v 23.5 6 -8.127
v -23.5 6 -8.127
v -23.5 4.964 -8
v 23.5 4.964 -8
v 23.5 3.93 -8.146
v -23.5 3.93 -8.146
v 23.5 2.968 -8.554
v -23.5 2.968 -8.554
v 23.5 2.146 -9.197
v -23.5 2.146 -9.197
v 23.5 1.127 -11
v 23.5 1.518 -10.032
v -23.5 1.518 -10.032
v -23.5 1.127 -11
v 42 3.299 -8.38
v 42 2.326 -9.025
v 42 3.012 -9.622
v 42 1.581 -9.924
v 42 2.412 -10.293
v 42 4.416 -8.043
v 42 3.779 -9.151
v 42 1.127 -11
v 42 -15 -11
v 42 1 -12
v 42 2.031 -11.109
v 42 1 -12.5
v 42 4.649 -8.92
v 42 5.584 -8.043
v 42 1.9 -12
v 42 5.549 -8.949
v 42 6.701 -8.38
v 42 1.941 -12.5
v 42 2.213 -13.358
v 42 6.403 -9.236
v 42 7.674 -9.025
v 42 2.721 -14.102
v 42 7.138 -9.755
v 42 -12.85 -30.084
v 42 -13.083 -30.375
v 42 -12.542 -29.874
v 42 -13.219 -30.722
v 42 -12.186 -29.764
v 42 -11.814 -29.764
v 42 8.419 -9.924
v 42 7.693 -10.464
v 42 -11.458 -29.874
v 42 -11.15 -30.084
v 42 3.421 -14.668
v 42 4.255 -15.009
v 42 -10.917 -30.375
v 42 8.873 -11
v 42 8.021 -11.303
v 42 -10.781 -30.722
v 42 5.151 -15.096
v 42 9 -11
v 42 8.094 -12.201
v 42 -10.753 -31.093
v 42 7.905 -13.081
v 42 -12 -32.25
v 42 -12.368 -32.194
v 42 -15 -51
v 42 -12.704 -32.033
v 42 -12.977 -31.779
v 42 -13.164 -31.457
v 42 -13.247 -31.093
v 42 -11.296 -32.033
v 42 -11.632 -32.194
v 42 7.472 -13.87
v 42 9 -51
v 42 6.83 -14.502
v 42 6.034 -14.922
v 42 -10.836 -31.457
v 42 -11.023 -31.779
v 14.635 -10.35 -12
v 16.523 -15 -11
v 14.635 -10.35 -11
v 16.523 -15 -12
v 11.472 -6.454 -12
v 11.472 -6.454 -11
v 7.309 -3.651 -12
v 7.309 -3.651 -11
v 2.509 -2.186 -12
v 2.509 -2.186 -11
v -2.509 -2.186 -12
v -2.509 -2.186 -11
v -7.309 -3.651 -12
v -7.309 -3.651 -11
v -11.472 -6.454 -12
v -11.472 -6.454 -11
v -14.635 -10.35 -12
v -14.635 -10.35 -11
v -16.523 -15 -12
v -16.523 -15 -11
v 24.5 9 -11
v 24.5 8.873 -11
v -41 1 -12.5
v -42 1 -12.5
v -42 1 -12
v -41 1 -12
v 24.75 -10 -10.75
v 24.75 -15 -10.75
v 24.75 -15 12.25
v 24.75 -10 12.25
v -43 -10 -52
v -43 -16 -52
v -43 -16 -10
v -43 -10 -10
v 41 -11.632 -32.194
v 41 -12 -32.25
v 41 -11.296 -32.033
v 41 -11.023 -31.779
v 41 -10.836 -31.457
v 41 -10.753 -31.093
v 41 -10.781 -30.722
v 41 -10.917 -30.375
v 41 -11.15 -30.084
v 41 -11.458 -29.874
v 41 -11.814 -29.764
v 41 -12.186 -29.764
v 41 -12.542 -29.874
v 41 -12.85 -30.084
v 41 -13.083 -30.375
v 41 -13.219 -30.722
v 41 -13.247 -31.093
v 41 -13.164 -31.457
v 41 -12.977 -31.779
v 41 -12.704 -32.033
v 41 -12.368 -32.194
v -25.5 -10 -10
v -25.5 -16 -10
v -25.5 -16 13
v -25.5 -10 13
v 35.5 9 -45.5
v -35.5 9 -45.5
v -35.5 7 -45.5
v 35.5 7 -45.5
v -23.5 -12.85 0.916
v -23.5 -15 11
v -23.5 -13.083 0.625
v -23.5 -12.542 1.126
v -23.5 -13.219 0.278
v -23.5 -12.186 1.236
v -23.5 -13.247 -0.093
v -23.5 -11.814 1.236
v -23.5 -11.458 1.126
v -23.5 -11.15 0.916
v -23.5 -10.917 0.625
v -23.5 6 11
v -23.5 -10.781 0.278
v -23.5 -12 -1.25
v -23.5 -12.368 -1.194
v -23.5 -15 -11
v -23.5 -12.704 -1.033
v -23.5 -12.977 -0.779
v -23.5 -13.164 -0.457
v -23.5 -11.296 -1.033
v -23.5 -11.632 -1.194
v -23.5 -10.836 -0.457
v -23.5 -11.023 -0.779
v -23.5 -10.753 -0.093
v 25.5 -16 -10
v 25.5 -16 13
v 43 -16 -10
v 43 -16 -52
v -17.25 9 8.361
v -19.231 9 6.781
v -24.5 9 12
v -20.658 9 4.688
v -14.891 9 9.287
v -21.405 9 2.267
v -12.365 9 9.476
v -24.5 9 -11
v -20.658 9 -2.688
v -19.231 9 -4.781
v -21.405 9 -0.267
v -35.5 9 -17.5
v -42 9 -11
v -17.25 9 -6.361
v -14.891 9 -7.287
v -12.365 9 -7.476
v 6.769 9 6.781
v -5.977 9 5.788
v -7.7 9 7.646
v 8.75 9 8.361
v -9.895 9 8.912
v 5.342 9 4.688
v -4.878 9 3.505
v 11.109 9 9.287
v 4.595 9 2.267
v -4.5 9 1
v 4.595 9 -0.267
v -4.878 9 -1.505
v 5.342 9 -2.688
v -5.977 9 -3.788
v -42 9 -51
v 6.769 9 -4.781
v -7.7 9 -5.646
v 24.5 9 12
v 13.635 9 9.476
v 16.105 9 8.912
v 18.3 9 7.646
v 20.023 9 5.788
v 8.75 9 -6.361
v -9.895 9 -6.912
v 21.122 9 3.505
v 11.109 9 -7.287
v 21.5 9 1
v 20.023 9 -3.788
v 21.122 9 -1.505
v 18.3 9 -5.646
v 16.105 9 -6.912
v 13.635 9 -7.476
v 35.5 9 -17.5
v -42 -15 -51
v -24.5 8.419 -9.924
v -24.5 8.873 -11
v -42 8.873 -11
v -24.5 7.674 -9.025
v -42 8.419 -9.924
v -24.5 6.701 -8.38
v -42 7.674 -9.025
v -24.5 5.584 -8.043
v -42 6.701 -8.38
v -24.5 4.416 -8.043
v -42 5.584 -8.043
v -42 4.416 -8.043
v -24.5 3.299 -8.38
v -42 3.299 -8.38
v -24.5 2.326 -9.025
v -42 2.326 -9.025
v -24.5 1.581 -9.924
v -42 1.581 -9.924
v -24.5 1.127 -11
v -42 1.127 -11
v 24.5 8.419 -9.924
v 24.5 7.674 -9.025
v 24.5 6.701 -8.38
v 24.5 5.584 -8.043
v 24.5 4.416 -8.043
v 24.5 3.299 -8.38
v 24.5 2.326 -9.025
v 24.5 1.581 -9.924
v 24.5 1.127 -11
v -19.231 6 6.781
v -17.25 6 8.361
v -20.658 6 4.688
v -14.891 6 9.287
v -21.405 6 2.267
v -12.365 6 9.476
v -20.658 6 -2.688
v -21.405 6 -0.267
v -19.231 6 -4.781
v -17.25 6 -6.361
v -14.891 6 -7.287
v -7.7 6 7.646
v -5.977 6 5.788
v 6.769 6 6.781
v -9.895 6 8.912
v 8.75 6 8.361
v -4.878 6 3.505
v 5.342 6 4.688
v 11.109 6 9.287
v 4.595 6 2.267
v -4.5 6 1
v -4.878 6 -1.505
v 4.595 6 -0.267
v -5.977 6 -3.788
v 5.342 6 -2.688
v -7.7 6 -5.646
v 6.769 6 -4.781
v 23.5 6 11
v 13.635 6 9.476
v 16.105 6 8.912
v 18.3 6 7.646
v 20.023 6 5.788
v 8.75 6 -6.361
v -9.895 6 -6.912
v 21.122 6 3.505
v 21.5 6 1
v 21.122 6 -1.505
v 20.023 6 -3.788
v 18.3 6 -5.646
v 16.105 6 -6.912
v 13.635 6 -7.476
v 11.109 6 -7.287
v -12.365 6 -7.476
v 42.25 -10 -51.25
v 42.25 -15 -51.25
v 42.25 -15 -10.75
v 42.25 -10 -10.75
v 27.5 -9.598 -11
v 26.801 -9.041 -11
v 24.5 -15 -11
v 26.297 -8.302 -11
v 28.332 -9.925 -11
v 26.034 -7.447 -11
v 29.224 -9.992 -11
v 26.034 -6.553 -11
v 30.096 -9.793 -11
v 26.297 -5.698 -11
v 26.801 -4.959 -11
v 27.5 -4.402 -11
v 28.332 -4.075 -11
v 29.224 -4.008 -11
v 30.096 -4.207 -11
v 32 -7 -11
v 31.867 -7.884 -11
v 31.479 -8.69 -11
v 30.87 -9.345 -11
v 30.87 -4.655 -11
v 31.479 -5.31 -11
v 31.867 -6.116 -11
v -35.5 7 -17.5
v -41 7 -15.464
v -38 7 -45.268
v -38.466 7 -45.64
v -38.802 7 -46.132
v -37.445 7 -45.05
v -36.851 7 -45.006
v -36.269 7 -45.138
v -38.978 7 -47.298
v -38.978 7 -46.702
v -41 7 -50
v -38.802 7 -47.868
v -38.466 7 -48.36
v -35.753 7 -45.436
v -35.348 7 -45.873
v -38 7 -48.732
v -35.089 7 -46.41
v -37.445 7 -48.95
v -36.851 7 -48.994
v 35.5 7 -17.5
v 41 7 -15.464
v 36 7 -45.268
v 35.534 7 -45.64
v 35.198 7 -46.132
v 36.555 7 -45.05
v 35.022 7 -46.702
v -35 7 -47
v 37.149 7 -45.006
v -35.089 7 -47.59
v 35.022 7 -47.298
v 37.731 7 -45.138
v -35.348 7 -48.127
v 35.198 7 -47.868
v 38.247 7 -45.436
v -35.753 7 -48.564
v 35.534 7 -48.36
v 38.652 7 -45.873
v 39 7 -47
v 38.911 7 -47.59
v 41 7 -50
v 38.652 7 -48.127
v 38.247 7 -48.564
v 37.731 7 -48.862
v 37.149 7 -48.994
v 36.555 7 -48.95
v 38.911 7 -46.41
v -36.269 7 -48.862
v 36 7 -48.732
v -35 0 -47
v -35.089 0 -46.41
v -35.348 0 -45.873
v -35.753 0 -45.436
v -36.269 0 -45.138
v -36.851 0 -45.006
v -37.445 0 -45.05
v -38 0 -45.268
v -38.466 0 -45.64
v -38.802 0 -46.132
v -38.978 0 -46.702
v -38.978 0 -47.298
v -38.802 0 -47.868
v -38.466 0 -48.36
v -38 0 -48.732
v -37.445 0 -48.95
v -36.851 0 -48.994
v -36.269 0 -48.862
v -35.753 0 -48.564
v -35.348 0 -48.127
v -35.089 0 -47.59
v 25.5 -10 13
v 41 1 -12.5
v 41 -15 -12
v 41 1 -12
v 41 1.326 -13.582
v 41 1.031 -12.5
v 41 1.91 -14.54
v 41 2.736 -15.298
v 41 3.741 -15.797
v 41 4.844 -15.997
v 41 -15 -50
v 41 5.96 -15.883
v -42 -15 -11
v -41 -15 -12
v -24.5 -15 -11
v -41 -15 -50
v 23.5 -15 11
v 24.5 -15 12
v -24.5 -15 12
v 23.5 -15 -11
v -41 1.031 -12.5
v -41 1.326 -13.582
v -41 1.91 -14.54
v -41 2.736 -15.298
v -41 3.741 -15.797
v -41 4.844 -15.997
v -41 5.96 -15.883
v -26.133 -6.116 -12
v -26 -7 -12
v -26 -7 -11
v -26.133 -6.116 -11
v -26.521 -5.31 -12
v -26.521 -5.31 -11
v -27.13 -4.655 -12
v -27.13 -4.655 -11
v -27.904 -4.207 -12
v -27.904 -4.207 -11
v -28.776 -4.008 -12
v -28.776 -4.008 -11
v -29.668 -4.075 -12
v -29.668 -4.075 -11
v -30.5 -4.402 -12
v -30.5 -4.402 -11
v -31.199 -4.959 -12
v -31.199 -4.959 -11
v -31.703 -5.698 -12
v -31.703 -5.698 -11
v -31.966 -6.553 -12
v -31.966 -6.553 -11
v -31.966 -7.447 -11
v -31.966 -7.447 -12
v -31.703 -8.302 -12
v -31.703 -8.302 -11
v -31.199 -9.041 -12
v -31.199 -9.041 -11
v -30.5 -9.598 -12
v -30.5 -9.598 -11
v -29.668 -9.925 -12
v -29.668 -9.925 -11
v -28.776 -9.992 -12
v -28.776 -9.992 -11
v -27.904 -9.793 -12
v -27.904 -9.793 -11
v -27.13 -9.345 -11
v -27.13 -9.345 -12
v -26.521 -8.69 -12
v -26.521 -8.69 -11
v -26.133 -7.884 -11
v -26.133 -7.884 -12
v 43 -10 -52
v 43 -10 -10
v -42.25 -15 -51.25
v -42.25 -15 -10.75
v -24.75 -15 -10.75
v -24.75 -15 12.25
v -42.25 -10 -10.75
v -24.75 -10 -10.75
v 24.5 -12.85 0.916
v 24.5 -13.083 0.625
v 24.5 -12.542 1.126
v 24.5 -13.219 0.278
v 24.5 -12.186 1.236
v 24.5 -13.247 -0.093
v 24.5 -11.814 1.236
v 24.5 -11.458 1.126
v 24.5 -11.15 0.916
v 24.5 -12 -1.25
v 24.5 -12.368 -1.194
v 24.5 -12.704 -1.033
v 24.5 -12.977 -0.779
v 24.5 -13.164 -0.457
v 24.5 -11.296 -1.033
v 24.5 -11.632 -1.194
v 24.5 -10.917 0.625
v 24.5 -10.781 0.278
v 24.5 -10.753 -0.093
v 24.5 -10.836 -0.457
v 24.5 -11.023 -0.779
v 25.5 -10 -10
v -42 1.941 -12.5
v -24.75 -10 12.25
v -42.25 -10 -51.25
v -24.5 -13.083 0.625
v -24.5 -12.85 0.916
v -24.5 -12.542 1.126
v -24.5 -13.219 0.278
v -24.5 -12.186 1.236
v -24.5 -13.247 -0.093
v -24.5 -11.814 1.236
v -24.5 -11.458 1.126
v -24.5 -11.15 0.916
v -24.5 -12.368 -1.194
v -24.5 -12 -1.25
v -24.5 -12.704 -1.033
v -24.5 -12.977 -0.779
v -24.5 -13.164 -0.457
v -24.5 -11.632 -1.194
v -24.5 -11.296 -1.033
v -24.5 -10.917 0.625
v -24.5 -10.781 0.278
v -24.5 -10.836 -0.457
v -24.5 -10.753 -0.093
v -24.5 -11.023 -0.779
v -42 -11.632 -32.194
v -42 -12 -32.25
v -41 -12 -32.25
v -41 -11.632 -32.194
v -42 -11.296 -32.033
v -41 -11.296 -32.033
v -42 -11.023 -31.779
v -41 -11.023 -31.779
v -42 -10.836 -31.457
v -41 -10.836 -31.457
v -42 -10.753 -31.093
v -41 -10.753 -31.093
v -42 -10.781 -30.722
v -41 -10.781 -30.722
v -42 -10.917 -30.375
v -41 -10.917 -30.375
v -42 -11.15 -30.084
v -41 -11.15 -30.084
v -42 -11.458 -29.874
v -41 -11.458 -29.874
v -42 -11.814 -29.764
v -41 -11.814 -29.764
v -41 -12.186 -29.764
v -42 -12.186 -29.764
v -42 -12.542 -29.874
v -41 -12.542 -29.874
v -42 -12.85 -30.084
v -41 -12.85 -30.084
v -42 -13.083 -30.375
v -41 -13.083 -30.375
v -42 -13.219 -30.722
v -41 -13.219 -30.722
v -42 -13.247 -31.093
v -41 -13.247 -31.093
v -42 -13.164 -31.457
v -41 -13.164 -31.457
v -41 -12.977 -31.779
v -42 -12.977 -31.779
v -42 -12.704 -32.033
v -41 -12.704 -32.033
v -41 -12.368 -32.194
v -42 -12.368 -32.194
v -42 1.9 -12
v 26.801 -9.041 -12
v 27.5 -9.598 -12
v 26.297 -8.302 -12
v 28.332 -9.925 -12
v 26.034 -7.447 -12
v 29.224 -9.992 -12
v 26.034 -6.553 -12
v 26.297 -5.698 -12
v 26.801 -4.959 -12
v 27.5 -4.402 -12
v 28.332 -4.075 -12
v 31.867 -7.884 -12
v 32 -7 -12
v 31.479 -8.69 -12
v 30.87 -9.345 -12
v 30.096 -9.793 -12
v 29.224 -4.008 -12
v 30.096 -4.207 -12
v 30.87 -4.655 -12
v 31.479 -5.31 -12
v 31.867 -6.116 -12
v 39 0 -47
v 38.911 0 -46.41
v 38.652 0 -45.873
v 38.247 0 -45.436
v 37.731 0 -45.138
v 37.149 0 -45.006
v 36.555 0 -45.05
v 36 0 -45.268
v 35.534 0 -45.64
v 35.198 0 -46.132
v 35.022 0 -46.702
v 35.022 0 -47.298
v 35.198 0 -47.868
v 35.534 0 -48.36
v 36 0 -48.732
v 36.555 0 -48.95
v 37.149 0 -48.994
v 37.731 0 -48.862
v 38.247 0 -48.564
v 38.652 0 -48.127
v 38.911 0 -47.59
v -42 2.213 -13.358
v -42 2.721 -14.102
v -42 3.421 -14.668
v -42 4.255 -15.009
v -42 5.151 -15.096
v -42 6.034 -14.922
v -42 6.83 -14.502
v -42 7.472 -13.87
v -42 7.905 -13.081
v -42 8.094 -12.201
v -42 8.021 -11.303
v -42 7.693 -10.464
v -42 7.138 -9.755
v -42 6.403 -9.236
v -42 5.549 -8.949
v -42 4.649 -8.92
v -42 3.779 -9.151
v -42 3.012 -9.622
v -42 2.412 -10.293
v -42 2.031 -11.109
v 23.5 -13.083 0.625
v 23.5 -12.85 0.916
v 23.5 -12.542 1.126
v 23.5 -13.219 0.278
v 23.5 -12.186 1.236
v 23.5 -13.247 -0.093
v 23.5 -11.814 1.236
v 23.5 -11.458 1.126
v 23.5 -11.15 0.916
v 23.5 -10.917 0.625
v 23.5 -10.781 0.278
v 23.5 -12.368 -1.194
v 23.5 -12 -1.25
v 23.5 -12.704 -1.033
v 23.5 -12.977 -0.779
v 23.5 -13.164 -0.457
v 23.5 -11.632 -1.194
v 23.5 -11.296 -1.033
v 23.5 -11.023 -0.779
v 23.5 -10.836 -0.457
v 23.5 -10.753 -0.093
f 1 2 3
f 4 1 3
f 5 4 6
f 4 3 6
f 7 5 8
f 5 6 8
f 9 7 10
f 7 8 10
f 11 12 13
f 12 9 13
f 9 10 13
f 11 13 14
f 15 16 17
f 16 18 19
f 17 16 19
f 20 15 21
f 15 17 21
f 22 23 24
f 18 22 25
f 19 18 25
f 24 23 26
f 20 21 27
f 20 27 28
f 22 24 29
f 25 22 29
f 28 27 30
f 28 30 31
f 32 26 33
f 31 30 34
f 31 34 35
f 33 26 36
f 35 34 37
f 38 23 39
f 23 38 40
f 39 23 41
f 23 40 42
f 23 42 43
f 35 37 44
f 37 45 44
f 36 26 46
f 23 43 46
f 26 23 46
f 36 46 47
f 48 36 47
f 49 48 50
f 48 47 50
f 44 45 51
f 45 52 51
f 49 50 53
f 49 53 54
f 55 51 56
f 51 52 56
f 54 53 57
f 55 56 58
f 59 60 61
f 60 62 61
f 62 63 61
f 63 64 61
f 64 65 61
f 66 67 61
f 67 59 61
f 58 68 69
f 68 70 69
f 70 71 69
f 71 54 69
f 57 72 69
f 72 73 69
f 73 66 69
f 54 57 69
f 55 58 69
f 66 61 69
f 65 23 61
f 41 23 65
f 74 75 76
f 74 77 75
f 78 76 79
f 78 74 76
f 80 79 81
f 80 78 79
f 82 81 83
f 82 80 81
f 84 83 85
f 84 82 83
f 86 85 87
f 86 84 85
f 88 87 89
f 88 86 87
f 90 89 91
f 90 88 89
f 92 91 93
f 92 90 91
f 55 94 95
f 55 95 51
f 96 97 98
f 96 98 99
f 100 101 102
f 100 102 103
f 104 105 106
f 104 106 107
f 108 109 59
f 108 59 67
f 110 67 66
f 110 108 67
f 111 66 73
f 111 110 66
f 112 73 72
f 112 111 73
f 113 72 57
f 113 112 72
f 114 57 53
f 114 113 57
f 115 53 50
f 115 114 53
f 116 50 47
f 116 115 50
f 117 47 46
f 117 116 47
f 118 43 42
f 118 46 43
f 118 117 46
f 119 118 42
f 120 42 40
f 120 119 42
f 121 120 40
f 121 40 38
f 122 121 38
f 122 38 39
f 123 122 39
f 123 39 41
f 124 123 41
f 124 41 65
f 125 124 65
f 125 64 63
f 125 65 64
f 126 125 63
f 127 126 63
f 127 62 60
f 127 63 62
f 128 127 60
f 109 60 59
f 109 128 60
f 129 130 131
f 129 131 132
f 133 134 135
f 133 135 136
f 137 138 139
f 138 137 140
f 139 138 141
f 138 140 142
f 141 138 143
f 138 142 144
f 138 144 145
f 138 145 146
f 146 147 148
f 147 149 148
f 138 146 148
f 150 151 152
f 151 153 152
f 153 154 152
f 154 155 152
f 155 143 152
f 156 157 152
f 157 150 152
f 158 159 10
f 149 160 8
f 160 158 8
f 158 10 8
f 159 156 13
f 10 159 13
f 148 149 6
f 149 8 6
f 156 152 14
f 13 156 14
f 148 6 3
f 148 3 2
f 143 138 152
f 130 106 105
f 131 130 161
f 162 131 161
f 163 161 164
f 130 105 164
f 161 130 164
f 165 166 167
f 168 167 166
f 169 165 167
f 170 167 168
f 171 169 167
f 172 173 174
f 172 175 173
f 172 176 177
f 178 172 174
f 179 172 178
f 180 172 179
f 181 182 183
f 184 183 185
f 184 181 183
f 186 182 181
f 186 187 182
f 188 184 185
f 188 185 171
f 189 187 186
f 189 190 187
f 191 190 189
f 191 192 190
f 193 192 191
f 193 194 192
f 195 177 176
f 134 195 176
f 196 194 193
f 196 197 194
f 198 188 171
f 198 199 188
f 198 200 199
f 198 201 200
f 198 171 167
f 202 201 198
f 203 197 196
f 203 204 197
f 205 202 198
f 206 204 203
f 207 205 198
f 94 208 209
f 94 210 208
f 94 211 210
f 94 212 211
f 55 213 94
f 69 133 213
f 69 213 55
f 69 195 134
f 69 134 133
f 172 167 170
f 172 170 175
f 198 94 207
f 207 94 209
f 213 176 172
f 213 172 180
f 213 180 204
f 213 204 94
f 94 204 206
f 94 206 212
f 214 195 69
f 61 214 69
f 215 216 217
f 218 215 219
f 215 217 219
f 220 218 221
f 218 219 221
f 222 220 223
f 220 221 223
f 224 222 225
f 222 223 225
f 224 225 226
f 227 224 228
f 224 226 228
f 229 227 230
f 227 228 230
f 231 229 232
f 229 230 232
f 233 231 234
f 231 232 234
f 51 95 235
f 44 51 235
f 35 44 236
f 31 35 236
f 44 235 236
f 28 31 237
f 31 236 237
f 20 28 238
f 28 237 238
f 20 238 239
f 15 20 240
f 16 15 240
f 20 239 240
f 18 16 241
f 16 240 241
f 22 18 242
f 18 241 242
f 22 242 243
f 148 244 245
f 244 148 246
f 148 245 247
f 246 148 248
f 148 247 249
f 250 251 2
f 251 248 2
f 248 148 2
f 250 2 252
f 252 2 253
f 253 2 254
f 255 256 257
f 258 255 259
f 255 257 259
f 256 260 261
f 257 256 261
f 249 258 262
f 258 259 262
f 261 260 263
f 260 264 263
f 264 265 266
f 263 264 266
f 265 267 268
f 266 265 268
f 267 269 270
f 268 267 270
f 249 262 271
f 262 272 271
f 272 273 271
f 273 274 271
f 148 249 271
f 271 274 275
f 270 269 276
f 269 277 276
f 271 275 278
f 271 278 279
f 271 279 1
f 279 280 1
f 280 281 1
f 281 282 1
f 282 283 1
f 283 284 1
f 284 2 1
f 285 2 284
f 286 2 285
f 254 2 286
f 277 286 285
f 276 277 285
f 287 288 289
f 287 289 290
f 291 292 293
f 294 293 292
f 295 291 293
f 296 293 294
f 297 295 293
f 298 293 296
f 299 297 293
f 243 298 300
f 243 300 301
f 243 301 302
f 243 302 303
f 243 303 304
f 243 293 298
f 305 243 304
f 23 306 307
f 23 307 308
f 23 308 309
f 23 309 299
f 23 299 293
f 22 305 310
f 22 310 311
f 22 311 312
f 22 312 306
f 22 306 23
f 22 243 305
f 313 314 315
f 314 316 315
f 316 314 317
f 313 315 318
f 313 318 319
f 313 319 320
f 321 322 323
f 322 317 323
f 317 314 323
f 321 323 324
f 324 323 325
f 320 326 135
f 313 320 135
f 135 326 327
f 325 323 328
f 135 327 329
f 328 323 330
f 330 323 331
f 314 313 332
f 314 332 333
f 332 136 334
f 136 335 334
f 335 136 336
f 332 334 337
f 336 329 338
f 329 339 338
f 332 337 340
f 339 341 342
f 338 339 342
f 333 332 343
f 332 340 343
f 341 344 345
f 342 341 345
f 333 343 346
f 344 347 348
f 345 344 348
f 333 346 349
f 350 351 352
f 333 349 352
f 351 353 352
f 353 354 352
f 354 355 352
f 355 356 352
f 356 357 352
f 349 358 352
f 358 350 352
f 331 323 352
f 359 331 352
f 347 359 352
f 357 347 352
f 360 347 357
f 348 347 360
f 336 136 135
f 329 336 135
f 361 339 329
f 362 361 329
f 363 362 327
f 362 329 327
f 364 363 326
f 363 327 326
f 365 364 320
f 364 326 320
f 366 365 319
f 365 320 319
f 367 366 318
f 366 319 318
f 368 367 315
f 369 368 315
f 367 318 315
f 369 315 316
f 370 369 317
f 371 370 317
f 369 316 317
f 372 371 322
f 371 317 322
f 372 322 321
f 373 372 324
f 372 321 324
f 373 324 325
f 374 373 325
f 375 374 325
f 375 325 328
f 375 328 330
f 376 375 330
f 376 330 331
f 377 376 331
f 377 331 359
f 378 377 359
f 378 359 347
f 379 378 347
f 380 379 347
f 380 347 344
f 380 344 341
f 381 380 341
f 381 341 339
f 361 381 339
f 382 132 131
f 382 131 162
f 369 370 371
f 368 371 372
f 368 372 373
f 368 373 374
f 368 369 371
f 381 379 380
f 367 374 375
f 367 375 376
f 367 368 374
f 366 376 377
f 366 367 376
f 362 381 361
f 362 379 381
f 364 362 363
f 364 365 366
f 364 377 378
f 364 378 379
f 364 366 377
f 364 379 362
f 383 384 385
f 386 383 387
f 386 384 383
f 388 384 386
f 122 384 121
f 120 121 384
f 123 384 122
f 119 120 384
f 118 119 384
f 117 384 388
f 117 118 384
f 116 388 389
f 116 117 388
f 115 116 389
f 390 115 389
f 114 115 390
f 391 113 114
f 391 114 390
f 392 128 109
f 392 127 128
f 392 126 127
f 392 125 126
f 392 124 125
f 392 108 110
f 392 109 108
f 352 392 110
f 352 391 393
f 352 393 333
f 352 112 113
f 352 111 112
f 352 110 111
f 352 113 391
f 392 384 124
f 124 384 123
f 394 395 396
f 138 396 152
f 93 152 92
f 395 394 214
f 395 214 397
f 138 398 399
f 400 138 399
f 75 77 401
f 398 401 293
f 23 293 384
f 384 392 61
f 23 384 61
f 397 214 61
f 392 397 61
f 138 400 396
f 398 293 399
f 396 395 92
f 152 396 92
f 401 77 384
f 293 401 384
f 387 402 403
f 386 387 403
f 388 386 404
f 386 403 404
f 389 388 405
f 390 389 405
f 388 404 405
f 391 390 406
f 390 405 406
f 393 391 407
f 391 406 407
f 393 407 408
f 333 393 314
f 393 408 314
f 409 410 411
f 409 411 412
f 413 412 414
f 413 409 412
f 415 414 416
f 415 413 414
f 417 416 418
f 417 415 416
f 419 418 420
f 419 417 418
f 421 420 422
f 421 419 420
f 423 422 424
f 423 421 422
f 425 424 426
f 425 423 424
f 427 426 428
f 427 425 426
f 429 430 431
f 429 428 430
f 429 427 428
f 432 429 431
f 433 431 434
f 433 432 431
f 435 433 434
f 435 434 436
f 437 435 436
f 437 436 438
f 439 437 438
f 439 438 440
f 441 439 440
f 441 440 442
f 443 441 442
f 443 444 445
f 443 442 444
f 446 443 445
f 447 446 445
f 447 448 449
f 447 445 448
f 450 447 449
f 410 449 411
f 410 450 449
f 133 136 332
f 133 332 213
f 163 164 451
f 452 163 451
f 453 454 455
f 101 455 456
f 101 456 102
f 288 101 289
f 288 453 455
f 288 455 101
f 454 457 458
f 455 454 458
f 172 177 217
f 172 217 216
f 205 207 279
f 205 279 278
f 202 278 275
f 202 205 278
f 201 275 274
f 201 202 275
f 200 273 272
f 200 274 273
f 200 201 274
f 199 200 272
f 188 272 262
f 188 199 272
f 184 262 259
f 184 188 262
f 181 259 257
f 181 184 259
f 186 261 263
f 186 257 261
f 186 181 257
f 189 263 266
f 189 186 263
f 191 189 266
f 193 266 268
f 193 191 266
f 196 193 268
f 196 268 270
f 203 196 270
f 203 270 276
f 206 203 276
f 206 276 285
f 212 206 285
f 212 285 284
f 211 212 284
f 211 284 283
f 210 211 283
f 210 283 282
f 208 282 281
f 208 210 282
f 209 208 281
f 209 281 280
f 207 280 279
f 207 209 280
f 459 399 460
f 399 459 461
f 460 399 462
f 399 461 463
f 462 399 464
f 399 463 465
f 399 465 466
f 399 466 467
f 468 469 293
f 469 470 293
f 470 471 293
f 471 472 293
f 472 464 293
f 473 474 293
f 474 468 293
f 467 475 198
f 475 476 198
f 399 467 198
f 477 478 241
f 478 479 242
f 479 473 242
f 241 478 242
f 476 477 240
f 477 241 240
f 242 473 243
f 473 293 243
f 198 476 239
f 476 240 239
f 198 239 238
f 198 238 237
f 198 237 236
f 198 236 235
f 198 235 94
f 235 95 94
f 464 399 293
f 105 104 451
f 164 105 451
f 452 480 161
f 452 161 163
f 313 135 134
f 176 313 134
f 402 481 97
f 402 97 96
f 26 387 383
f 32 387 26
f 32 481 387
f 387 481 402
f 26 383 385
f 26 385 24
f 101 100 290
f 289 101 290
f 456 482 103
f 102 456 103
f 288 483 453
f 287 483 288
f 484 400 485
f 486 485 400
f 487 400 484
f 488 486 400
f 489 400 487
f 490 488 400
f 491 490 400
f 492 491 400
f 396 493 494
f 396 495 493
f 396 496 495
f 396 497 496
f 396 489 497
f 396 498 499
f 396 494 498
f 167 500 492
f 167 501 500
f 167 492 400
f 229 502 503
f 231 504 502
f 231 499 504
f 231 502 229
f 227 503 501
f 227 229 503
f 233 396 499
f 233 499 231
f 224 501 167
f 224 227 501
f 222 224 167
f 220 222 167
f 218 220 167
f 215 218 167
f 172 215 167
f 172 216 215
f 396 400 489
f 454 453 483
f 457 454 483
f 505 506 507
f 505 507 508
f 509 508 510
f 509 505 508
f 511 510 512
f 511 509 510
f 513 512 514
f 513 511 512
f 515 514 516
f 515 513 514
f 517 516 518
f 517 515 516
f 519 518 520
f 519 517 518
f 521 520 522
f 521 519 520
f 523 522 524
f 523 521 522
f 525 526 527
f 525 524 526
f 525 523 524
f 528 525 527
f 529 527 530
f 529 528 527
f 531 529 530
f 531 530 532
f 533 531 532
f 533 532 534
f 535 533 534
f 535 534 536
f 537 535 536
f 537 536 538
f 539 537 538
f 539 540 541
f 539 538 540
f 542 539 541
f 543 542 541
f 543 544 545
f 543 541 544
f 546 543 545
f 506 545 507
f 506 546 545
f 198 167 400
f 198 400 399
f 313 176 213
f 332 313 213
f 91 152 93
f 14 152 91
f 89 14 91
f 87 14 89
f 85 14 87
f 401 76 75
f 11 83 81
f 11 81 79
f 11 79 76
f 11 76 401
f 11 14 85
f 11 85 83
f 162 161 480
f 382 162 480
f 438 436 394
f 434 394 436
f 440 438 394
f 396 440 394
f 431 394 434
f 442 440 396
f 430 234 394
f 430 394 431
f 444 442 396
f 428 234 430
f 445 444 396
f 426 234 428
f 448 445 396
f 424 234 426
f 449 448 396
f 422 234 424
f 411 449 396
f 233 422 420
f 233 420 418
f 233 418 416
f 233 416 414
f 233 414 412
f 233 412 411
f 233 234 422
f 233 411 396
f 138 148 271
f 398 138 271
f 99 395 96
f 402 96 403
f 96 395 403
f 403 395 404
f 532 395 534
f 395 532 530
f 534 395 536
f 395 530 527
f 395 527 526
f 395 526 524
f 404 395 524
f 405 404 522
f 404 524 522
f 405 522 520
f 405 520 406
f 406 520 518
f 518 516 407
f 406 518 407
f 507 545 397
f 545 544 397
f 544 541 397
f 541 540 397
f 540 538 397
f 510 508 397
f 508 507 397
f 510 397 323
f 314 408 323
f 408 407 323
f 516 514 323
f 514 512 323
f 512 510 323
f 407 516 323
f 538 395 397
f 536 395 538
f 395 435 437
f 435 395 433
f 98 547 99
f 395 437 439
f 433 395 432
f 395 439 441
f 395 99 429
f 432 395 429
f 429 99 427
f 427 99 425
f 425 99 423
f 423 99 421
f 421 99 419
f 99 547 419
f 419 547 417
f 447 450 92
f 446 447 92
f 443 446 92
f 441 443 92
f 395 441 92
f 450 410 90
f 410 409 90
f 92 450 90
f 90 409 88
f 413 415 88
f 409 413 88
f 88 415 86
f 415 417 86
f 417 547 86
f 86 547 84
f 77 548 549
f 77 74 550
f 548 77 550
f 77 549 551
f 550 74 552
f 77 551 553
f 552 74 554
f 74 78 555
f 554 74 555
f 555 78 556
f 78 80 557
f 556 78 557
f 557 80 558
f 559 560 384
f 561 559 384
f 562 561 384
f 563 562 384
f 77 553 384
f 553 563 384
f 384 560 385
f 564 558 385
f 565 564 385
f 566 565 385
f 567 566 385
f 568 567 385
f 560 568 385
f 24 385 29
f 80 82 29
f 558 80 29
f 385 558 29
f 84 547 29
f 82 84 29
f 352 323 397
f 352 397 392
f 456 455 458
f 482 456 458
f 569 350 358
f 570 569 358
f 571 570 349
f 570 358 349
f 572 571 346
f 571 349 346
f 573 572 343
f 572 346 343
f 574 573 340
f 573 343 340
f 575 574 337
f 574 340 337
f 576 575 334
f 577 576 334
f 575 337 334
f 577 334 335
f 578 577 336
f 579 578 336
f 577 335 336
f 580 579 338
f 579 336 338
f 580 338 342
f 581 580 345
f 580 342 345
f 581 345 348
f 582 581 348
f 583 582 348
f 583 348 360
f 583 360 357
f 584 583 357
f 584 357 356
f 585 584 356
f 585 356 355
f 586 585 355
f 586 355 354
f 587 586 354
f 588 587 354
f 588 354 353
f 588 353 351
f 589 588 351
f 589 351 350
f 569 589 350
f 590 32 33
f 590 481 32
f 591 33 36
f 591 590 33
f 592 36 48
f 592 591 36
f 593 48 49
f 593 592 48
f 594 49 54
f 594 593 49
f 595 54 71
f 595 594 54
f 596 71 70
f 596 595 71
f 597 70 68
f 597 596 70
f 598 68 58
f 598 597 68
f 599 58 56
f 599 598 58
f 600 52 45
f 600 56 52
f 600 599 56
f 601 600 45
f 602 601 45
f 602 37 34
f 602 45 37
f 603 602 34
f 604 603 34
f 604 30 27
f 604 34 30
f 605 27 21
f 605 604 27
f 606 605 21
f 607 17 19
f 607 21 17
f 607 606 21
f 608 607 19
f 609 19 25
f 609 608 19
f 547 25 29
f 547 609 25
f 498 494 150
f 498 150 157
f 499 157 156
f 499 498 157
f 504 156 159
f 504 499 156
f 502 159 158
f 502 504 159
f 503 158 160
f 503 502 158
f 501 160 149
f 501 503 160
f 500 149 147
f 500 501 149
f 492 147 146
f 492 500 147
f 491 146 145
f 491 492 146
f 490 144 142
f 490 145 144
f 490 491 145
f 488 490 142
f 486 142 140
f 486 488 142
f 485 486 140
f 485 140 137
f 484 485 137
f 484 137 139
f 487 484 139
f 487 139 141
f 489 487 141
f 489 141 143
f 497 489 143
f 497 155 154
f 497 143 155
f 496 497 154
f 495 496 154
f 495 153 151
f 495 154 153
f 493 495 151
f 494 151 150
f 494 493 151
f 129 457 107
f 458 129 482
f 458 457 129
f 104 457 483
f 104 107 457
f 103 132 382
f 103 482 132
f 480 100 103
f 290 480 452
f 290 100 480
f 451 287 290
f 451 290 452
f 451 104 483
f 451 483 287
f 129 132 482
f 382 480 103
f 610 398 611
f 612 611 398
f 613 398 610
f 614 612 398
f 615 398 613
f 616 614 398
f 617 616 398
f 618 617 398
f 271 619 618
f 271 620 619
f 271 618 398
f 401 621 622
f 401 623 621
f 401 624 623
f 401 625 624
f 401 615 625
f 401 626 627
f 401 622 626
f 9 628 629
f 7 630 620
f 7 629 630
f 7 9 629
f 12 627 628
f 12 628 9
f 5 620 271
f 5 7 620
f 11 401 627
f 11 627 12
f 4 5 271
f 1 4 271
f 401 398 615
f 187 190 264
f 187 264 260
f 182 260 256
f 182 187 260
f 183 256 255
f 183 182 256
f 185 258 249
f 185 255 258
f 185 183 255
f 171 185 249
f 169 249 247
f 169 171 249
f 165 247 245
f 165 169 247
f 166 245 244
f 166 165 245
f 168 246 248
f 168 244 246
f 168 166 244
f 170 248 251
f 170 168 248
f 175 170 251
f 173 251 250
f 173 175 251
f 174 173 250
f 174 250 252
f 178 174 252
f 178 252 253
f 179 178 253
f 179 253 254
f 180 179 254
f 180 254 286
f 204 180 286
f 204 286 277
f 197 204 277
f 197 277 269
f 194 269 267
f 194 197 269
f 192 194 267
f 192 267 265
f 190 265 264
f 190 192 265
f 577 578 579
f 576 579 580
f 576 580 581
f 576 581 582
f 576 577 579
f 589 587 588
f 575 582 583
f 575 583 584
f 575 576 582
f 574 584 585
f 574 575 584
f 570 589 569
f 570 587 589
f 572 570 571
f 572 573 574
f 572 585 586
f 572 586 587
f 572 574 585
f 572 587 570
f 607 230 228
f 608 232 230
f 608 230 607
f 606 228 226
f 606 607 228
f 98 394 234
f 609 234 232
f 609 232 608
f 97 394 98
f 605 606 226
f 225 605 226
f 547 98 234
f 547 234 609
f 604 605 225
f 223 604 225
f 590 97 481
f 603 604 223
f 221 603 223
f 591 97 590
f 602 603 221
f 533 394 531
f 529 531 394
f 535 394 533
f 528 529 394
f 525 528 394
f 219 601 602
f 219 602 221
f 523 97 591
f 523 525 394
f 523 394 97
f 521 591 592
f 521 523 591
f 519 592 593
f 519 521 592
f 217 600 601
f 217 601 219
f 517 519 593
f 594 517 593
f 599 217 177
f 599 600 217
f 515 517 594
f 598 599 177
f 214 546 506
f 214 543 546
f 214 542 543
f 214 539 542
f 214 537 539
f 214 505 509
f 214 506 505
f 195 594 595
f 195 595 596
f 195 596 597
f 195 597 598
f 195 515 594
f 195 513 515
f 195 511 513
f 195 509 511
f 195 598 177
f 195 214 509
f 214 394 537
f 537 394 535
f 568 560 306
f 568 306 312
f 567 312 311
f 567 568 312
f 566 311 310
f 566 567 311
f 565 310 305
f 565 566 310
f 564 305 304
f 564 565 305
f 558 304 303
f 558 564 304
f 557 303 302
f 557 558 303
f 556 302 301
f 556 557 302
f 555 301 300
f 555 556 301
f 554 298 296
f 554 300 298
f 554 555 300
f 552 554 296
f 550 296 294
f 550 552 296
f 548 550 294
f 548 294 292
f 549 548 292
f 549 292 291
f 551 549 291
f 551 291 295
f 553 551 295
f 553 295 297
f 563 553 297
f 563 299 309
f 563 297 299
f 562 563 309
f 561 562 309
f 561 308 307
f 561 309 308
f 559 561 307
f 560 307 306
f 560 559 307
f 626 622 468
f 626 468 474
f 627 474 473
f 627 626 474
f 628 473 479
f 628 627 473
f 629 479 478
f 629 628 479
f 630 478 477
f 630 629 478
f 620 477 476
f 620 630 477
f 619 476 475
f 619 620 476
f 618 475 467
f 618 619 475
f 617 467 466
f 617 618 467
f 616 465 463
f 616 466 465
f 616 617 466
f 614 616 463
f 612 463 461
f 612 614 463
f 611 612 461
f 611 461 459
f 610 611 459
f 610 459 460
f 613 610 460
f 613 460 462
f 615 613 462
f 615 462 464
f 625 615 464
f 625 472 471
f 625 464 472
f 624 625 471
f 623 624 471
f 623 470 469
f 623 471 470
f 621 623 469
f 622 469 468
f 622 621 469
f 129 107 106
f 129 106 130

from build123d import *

# Parameters (mm, degrees)
CYLINDER004_R           = 1.25
CYLINDER004_DEPTH       = 50
CYLINDER004_PITCH_ANGLE = 90
CYLINDER009_R           = 1.25
CYLINDER009_DEPTH       = 86
CYLINDER009_PITCH_ANGLE = 90
CYLINDER010_R           = 3
CYLINDER010_DEPTH       = 10
CYLINDER005_R           = 3
CYLINDER005_DEPTH       = 10
BOX002_W                = 84
BOX002_H                = 3
BOX002_DEPTH            = 0.5
CYLINDER002_R           = 3.1
CYLINDER002_DEPTH       = 84
CYLINDER002_PITCH_ANGLE = 90
CYLINDER007_R           = 17
CYLINDER007_DEPTH       = 6
BOX005_W                = 71
BOX005_H                = 24
BOX005_DEPTH            = 28
BOX004_W                = 82
BOX004_H                = 24
BOX004_DEPTH            = 38
BOX003_W                = 84
BOX003_H                = 24
BOX003_DEPTH            = 40
CYLINDER003_R           = 4
CYLINDER003_DEPTH       = 84
CYLINDER003_PITCH_ANGLE = 90
CYLINDER008_R           = 2
CYLINDER008_DEPTH       = 8
CYLINDER008_ROLL_ANGLE  = 90
CYLINDER006_R           = 2
CYLINDER006_DEPTH       = 8
CYLINDER006_ROLL_ANGLE  = 90
CYLINDER001_R           = 8.5
CYLINDER001_DEPTH       = 20
CYLINDER001_ROLL_ANGLE  = 90
CYLINDER_R              = 8.5
CYLINDER_DEPTH          = 20
CYLINDER_ROLL_ANGLE     = 90
BOX001_W                = 47
BOX001_H                = 22
BOX001_DEPTH            = 23
BOX_W                   = 49
BOX_H                   = 24
BOX_DEPTH               = 24
BOX009_W                = 49.5
BOX009_H                = 24
BOX009_DEPTH            = 24.5
BOX008_W                = 84.5
BOX008_H                = 24
BOX008_DEPTH            = 40.5
BOX007_W                = 51
BOX007_H                = 6
BOX007_DEPTH            = 26
BOX006_W                = 86
BOX006_H                = 6
BOX006_DEPTH            = 42


with BuildPart() as recorte_tornillos_tapa:
    # Cylinder004 → Cylinder004 (new body)
    with BuildSketch(Plane.XY):
        Circle(CYLINDER004_R)
    extrude(amount=CYLINDER004_DEPTH)


with BuildPart() as recorte_tornillos_tapa_1:
    # Cylinder004 pitch: moved
    add(recorte_tornillos_tapa.part.rotate(Axis((0, 0, 0), (0, 1, 0)), CYLINDER004_PITCH_ANGLE))


with BuildPart() as recorte_tornillos_tapa_2:
    # Cylinder004 placement: moved
    add(recorte_tornillos_tapa_1.part.moved(Location((-25, -12, 0))))


with BuildPart() as recorte_tornillos_tapa001:
    # Cylinder009 → Cylinder009 (new body)
    with BuildSketch(Plane.XY):
        Circle(CYLINDER009_R)
    extrude(amount=CYLINDER009_DEPTH)


with BuildPart() as recorte_tornillos_tapa001_1:
    # Cylinder009 pitch: moved
    add(recorte_tornillos_tapa001.part.rotate(Axis((0, 0, 0), (0, 1, 0)), CYLINDER009_PITCH_ANGLE))


with BuildPart() as recorte_tornillos_tapa001_2:
    # Cylinder009 placement: moved
    add(recorte_tornillos_tapa001_1.part.moved(Location((-43, -12, -31))))


with BuildPart() as recorte_cables001:
    # Cylinder010 → Cylinder010 (new body)
    with BuildSketch(Plane(origin=(-29, -7, -17), x_dir=(1, 0, 0), z_dir=(0, 0, 1))):
        Circle(CYLINDER010_R)
    extrude(amount=CYLINDER010_DEPTH)


with BuildPart() as fusion002:
    # Cylinder005 → Cylinder005 (new body)
    with BuildSketch(Plane(origin=(29, -7, -17), x_dir=(1, 0, 0), z_dir=(0, 0, 1))):
        Circle(CYLINDER005_R)
    extrude(amount=CYLINDER005_DEPTH)

    # Fusion002: union recorte tornillos tapa, recorte tornillos tapa001, recorte cables001
    add(recorte_tornillos_tapa_2.part)
    add(recorte_tornillos_tapa001_2.part)
    add(recorte_cables001.part)


with BuildPart() as recorte_eje:
    # Box002 → Box002 (new body)
    with BuildSketch(Plane(origin=(-42, 1, -12.5), x_dir=(1, 0, 0), z_dir=(0, 0, 1))):
        with Locations((42, 1.5)):
            Rectangle(BOX002_W, BOX002_H)
    extrude(amount=BOX002_DEPTH)


with BuildPart() as recorte_central_eje:
    # Cylinder002 → Cylinder002 (new body)
    with BuildSketch(Plane.XY):
        Circle(CYLINDER002_R)
    extrude(amount=CYLINDER002_DEPTH)


with BuildPart() as recorte_central_eje_1:
    # Cylinder002 pitch: moved
    add(recorte_central_eje.part.rotate(Axis((0, 0, 0), (0, 1, 0)), CYLINDER002_PITCH_ANGLE))


with BuildPart() as recorte_central_eje_2:
    # Cylinder002 placement: moved
    add(recorte_central_eje_1.part.moved(Location((-42, 5, -12))))


with BuildPart() as recorte_pasos:
    # Cylinder007 → Cylinder007 (new body)
    with BuildSketch(Plane(origin=(0, -19, -16), x_dir=(1, 0, 0), z_dir=(0, 0, 1))):
        Circle(CYLINDER007_R)
    extrude(amount=CYLINDER007_DEPTH)


with BuildPart() as recorte_lcd:
    # Box005 → Box005 (new body)
    with BuildSketch(Plane(origin=(-35.5, -14, -45.5), x_dir=(1, 0, 0), z_dir=(0, 0, 1))):
        with Locations((35.5, 12)):
            Rectangle(BOX005_W, BOX005_H)
    extrude(amount=BOX005_DEPTH)


with BuildPart() as recorte_baselcd:
    # Box004 → Box004 (new body)
    with BuildSketch(Plane(origin=(-41, -17, -50), x_dir=(1, 0, 0), z_dir=(0, 0, 1))):
        with Locations((41, 12)):
            Rectangle(BOX004_W, BOX004_H)
    extrude(amount=BOX004_DEPTH)


with BuildPart() as base_lcd:
    # Box003 → Box003 (new body)
    with BuildSketch(Plane(origin=(-42, -15, -51), x_dir=(1, 0, 0), z_dir=(0, 0, 1))):
        with Locations((42, 12)):
            Rectangle(BOX003_W, BOX003_H)
    extrude(amount=BOX003_DEPTH)

    # Cut002: cut recorte_baseLCD
    add(recorte_baselcd.part, mode=Mode.SUBTRACT)

    # Cut003: cut recorte_LCD
    add(recorte_lcd.part, mode=Mode.SUBTRACT)


with BuildPart() as eje_central:
    # Cylinder003 → Cylinder003 (new body)
    with BuildSketch(Plane.XY):
        Circle(CYLINDER003_R)
    extrude(amount=CYLINDER003_DEPTH)


with BuildPart() as eje_central_1:
    # Cylinder003 pitch: moved
    add(eje_central.part.rotate(Axis((0, 0, 0), (0, 1, 0)), CYLINDER003_PITCH_ANGLE))


with BuildPart() as eje_central_2:
    # Cylinder003 placement: moved
    add(eje_central_1.part.moved(Location((-42, 5, -12))))


with BuildPart() as cylinder008:
    # Cylinder008 → Cylinder008 (new body)
    with BuildSketch(Plane.XY):
        Circle(CYLINDER008_R)
    extrude(amount=CYLINDER008_DEPTH)


with BuildPart() as cylinder008_1:
    # Cylinder008 roll: moved
    add(cylinder008.part.rotate(Axis((0, 0, 0), (1, 0, 0)), CYLINDER008_ROLL_ANGLE))


with BuildPart() as cylinder008_2:
    # Cylinder008 placement: moved
    add(cylinder008_1.part.moved(Location((37, 8, -47))))


with BuildPart() as cylinder006:
    # Cylinder006 → Cylinder006 (new body)
    with BuildSketch(Plane.XY):
        Circle(CYLINDER006_R)
    extrude(amount=CYLINDER006_DEPTH)


with BuildPart() as cylinder006_1:
    # Cylinder006 roll: moved
    add(cylinder006.part.rotate(Axis((0, 0, 0), (1, 0, 0)), CYLINDER006_ROLL_ANGLE))


with BuildPart() as cylinder006_2:
    # Cylinder006 placement: moved
    add(cylinder006_1.part.moved(Location((-37, 8, -47))))


with BuildPart() as ultrasoun002:
    # Cylinder001 → Cylinder001 (new body)
    with BuildSketch(Plane.XY):
        Circle(CYLINDER001_R)
    extrude(amount=CYLINDER001_DEPTH)


with BuildPart() as ultrasoun002_1:
    # Cylinder001 roll: moved
    add(ultrasoun002.part.rotate(Axis((0, 0, 0), (1, 0, 0)), CYLINDER001_ROLL_ANGLE))


with BuildPart() as ultrasoun002_2:
    # Cylinder001 placement: moved
    add(ultrasoun002_1.part.moved(Location((13, 10, 0))))


with BuildPart() as f_2xultrasonidos:
    # Cylinder → Cylinder (new body)
    with BuildSketch(Plane.XY):
        Circle(CYLINDER_R)
    extrude(amount=CYLINDER_DEPTH)


with BuildPart() as f_2xultrasonidos_1:
    # Cylinder roll: moved
    add(f_2xultrasonidos.part.rotate(Axis((0, 0, 0), (1, 0, 0)), CYLINDER_ROLL_ANGLE))


with BuildPart() as f_2xultrasonidos_2:
    # Cylinder placement: moved
    add(f_2xultrasonidos_1.part.moved(Location((-13, 10, 0))))

    # Fusion: union ultraSoun002
    add(ultrasoun002_2.part)


with BuildPart() as f_2xultrasonidos_3:
    # Fusion placement: moved
    add(f_2xultrasonidos_2.part.moved(Location((0, 0, 1))))


with BuildPart() as recote_base:
    # Box001 → Box001 (new body)
    with BuildSketch(Plane(origin=(-23.5, -16, -12), x_dir=(1, 0, 0), z_dir=(0, 0, 1))):
        with Locations((23.5, 11)):
            Rectangle(BOX001_W, BOX001_H)
    extrude(amount=BOX001_DEPTH)


with BuildPart() as lcd_arduino_holder:
    # Box → Box (new body)
    with BuildSketch(Plane(origin=(-24.5, -15, -12), x_dir=(1, 0, 0), z_dir=(0, 0, 1))):
        with Locations((24.5, 12)):
            Rectangle(BOX_W, BOX_H)
    extrude(amount=BOX_DEPTH)

    # Cut: cut recote base
    add(recote_base.part, mode=Mode.SUBTRACT)

    # Cut001: cut 2xUltrasonidos
    add(f_2xultrasonidos_3.part, mode=Mode.SUBTRACT)

    # Fusion001: union base lcd, eje_central, Cylinder008, Cylinder006
    add(base_lcd.part)
    add(eje_central_2.part)
    add(cylinder008_2.part)
    add(cylinder006_2.part)

    # Cut004: cut recorte pasos
    add(recorte_pasos.part, mode=Mode.SUBTRACT)

    # Cut005: cut recorte central eje
    add(recorte_central_eje_2.part, mode=Mode.SUBTRACT)

    # Cut006: cut recorte eje
    add(recorte_eje.part, mode=Mode.SUBTRACT)

    # Cut007: cut Fusion002
    add(fusion002.part, mode=Mode.SUBTRACT)


with BuildPart() as base_bot002:
    # Box009 → Box009 (new body)
    with BuildSketch(Plane(origin=(-24.75, -15, -12.25), x_dir=(1, 0, 0), z_dir=(0, 0, 1))):
        with Locations((24.75, 12)):
            Rectangle(BOX009_W, BOX009_H)
    extrude(amount=BOX009_DEPTH)


with BuildPart() as fusion004:
    # Box008 → Box008 (new body)
    with BuildSketch(Plane(origin=(-42.25, -15, -51.25), x_dir=(1, 0, 0), z_dir=(0, 0, 1))):
        with Locations((42.25, 12)):
            Rectangle(BOX008_W, BOX008_H)
    extrude(amount=BOX008_DEPTH)

    # Fusion004: union base_bot002
    add(base_bot002.part)


with BuildPart() as base_bot001:
    # Box007 → Box007 (new body)
    with BuildSketch(Plane(origin=(-25.5, -16, -13), x_dir=(1, 0, 0), z_dir=(0, 0, 1))):
        with Locations((25.5, 3)):
            Rectangle(BOX007_W, BOX007_H)
    extrude(amount=BOX007_DEPTH)


with BuildPart() as cover:
    # Box006 → Box006 (new body)
    with BuildSketch(Plane(origin=(-43, -16, -52), x_dir=(1, 0, 0), z_dir=(0, 0, 1))):
        with Locations((43, 3)):
            Rectangle(BOX006_W, BOX006_H)
    extrude(amount=BOX006_DEPTH)

    # Fusion003: union base_bot001
    add(base_bot001.part)

    # Cut008: cut Fusion004
    add(fusion004.part, mode=Mode.SUBTRACT)


solid = Compound([lcd_arduino_holder.part, cover.part])
